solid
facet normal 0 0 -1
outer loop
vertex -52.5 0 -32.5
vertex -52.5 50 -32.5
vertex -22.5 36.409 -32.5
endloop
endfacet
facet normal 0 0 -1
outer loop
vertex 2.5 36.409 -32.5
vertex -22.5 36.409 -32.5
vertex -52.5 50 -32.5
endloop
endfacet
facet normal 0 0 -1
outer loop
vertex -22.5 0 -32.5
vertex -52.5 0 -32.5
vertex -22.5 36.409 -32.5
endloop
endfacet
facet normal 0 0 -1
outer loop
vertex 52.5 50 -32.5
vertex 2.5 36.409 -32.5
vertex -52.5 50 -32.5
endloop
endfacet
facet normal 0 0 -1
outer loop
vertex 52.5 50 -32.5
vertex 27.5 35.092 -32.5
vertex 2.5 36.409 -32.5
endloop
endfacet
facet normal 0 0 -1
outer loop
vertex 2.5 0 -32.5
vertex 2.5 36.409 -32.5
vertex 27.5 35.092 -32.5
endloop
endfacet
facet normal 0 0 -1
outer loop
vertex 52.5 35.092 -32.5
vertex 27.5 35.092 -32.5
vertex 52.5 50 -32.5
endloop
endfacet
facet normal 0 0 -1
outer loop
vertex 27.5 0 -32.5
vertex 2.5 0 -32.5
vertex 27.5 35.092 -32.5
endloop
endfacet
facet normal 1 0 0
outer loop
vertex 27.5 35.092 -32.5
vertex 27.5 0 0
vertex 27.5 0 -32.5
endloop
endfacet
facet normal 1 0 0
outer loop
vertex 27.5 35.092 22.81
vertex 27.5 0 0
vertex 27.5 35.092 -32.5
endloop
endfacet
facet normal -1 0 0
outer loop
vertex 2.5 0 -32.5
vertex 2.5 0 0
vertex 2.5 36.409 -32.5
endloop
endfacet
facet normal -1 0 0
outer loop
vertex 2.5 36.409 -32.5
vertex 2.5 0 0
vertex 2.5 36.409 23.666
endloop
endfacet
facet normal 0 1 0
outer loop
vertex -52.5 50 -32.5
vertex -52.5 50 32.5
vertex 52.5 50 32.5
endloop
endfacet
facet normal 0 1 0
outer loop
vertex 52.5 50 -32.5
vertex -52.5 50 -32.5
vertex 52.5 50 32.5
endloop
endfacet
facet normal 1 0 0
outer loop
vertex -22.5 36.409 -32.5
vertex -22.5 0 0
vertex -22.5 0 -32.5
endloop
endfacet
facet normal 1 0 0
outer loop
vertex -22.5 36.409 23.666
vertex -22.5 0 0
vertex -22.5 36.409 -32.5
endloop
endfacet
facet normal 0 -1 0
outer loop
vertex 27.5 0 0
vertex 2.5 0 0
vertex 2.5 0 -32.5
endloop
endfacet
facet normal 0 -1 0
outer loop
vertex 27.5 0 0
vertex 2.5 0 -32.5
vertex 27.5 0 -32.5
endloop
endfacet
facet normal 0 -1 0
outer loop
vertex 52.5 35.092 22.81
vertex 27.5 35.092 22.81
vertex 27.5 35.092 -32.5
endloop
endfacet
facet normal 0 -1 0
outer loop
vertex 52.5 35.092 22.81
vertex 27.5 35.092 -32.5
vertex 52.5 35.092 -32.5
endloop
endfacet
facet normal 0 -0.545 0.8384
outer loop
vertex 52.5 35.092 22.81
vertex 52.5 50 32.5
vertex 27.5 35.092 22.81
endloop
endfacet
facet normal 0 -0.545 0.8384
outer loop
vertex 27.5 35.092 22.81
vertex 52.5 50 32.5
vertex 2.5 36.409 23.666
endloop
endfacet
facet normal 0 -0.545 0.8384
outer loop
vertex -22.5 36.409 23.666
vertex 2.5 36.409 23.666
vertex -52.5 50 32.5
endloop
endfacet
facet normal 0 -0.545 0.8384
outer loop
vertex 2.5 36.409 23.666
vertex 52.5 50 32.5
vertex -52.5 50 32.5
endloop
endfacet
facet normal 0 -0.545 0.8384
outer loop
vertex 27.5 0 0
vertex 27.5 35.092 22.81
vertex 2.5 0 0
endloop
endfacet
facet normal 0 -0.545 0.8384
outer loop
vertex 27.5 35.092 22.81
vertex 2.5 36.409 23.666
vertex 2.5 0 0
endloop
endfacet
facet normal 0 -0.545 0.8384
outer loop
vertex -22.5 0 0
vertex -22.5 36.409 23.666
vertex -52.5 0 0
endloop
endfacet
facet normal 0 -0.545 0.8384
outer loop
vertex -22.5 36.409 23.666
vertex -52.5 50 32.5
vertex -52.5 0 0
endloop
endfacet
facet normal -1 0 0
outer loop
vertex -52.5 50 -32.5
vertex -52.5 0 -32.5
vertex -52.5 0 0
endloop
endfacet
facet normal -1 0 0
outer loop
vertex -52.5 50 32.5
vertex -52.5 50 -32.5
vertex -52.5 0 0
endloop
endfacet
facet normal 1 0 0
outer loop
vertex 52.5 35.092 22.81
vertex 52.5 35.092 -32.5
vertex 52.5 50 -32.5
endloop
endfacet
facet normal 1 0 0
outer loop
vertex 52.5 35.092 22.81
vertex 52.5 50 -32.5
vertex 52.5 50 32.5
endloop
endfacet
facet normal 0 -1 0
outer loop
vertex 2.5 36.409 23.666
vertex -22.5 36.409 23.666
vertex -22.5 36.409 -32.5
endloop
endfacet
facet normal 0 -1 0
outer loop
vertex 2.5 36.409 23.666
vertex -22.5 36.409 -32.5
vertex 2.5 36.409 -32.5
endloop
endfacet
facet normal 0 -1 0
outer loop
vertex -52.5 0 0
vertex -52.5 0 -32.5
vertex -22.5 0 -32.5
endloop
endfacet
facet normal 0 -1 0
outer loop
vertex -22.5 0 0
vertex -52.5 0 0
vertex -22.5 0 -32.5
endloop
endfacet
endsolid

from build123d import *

# Parameters (mm, degrees)
F0_W     = 105
F0_H     = 65
F1_DEPTH = 50
F2_W     = 25
F2_H     = 35.092428
F2_H_2   = 36.408834
F3_DEPTH = 65
F5_DEPTH = 105


with BuildPart() as f1:
    # F0 (on Front) → F1 (new body)
    with BuildSketch(Plane.XZ):
        Rectangle(F0_W, F0_H)
    extrude(amount=-F1_DEPTH)

    # F2 (on face) → F3 (cut)
    with BuildSketch(Plane.XY.offset(32.5)):
        with Locations((40, 17.546214)):
            Rectangle(F2_W, F2_H)
        with Locations((-10, 18.204417)):
            Rectangle(F2_W, F2_H_2)
    extrude(amount=-F3_DEPTH, mode=Mode.SUBTRACT)

    # F4 (on face) → F5 (cut)
    with BuildSketch(Plane(origin=(-52.5, 0, 0), x_dir=(0, -1, 0), z_dir=(-1, 0, 0))):
        Polygon((0, 32.5), (-50, 32.5), (0, 0), align=None)
    extrude(amount=-F5_DEPTH, mode=Mode.SUBTRACT)


solid = f1.part
